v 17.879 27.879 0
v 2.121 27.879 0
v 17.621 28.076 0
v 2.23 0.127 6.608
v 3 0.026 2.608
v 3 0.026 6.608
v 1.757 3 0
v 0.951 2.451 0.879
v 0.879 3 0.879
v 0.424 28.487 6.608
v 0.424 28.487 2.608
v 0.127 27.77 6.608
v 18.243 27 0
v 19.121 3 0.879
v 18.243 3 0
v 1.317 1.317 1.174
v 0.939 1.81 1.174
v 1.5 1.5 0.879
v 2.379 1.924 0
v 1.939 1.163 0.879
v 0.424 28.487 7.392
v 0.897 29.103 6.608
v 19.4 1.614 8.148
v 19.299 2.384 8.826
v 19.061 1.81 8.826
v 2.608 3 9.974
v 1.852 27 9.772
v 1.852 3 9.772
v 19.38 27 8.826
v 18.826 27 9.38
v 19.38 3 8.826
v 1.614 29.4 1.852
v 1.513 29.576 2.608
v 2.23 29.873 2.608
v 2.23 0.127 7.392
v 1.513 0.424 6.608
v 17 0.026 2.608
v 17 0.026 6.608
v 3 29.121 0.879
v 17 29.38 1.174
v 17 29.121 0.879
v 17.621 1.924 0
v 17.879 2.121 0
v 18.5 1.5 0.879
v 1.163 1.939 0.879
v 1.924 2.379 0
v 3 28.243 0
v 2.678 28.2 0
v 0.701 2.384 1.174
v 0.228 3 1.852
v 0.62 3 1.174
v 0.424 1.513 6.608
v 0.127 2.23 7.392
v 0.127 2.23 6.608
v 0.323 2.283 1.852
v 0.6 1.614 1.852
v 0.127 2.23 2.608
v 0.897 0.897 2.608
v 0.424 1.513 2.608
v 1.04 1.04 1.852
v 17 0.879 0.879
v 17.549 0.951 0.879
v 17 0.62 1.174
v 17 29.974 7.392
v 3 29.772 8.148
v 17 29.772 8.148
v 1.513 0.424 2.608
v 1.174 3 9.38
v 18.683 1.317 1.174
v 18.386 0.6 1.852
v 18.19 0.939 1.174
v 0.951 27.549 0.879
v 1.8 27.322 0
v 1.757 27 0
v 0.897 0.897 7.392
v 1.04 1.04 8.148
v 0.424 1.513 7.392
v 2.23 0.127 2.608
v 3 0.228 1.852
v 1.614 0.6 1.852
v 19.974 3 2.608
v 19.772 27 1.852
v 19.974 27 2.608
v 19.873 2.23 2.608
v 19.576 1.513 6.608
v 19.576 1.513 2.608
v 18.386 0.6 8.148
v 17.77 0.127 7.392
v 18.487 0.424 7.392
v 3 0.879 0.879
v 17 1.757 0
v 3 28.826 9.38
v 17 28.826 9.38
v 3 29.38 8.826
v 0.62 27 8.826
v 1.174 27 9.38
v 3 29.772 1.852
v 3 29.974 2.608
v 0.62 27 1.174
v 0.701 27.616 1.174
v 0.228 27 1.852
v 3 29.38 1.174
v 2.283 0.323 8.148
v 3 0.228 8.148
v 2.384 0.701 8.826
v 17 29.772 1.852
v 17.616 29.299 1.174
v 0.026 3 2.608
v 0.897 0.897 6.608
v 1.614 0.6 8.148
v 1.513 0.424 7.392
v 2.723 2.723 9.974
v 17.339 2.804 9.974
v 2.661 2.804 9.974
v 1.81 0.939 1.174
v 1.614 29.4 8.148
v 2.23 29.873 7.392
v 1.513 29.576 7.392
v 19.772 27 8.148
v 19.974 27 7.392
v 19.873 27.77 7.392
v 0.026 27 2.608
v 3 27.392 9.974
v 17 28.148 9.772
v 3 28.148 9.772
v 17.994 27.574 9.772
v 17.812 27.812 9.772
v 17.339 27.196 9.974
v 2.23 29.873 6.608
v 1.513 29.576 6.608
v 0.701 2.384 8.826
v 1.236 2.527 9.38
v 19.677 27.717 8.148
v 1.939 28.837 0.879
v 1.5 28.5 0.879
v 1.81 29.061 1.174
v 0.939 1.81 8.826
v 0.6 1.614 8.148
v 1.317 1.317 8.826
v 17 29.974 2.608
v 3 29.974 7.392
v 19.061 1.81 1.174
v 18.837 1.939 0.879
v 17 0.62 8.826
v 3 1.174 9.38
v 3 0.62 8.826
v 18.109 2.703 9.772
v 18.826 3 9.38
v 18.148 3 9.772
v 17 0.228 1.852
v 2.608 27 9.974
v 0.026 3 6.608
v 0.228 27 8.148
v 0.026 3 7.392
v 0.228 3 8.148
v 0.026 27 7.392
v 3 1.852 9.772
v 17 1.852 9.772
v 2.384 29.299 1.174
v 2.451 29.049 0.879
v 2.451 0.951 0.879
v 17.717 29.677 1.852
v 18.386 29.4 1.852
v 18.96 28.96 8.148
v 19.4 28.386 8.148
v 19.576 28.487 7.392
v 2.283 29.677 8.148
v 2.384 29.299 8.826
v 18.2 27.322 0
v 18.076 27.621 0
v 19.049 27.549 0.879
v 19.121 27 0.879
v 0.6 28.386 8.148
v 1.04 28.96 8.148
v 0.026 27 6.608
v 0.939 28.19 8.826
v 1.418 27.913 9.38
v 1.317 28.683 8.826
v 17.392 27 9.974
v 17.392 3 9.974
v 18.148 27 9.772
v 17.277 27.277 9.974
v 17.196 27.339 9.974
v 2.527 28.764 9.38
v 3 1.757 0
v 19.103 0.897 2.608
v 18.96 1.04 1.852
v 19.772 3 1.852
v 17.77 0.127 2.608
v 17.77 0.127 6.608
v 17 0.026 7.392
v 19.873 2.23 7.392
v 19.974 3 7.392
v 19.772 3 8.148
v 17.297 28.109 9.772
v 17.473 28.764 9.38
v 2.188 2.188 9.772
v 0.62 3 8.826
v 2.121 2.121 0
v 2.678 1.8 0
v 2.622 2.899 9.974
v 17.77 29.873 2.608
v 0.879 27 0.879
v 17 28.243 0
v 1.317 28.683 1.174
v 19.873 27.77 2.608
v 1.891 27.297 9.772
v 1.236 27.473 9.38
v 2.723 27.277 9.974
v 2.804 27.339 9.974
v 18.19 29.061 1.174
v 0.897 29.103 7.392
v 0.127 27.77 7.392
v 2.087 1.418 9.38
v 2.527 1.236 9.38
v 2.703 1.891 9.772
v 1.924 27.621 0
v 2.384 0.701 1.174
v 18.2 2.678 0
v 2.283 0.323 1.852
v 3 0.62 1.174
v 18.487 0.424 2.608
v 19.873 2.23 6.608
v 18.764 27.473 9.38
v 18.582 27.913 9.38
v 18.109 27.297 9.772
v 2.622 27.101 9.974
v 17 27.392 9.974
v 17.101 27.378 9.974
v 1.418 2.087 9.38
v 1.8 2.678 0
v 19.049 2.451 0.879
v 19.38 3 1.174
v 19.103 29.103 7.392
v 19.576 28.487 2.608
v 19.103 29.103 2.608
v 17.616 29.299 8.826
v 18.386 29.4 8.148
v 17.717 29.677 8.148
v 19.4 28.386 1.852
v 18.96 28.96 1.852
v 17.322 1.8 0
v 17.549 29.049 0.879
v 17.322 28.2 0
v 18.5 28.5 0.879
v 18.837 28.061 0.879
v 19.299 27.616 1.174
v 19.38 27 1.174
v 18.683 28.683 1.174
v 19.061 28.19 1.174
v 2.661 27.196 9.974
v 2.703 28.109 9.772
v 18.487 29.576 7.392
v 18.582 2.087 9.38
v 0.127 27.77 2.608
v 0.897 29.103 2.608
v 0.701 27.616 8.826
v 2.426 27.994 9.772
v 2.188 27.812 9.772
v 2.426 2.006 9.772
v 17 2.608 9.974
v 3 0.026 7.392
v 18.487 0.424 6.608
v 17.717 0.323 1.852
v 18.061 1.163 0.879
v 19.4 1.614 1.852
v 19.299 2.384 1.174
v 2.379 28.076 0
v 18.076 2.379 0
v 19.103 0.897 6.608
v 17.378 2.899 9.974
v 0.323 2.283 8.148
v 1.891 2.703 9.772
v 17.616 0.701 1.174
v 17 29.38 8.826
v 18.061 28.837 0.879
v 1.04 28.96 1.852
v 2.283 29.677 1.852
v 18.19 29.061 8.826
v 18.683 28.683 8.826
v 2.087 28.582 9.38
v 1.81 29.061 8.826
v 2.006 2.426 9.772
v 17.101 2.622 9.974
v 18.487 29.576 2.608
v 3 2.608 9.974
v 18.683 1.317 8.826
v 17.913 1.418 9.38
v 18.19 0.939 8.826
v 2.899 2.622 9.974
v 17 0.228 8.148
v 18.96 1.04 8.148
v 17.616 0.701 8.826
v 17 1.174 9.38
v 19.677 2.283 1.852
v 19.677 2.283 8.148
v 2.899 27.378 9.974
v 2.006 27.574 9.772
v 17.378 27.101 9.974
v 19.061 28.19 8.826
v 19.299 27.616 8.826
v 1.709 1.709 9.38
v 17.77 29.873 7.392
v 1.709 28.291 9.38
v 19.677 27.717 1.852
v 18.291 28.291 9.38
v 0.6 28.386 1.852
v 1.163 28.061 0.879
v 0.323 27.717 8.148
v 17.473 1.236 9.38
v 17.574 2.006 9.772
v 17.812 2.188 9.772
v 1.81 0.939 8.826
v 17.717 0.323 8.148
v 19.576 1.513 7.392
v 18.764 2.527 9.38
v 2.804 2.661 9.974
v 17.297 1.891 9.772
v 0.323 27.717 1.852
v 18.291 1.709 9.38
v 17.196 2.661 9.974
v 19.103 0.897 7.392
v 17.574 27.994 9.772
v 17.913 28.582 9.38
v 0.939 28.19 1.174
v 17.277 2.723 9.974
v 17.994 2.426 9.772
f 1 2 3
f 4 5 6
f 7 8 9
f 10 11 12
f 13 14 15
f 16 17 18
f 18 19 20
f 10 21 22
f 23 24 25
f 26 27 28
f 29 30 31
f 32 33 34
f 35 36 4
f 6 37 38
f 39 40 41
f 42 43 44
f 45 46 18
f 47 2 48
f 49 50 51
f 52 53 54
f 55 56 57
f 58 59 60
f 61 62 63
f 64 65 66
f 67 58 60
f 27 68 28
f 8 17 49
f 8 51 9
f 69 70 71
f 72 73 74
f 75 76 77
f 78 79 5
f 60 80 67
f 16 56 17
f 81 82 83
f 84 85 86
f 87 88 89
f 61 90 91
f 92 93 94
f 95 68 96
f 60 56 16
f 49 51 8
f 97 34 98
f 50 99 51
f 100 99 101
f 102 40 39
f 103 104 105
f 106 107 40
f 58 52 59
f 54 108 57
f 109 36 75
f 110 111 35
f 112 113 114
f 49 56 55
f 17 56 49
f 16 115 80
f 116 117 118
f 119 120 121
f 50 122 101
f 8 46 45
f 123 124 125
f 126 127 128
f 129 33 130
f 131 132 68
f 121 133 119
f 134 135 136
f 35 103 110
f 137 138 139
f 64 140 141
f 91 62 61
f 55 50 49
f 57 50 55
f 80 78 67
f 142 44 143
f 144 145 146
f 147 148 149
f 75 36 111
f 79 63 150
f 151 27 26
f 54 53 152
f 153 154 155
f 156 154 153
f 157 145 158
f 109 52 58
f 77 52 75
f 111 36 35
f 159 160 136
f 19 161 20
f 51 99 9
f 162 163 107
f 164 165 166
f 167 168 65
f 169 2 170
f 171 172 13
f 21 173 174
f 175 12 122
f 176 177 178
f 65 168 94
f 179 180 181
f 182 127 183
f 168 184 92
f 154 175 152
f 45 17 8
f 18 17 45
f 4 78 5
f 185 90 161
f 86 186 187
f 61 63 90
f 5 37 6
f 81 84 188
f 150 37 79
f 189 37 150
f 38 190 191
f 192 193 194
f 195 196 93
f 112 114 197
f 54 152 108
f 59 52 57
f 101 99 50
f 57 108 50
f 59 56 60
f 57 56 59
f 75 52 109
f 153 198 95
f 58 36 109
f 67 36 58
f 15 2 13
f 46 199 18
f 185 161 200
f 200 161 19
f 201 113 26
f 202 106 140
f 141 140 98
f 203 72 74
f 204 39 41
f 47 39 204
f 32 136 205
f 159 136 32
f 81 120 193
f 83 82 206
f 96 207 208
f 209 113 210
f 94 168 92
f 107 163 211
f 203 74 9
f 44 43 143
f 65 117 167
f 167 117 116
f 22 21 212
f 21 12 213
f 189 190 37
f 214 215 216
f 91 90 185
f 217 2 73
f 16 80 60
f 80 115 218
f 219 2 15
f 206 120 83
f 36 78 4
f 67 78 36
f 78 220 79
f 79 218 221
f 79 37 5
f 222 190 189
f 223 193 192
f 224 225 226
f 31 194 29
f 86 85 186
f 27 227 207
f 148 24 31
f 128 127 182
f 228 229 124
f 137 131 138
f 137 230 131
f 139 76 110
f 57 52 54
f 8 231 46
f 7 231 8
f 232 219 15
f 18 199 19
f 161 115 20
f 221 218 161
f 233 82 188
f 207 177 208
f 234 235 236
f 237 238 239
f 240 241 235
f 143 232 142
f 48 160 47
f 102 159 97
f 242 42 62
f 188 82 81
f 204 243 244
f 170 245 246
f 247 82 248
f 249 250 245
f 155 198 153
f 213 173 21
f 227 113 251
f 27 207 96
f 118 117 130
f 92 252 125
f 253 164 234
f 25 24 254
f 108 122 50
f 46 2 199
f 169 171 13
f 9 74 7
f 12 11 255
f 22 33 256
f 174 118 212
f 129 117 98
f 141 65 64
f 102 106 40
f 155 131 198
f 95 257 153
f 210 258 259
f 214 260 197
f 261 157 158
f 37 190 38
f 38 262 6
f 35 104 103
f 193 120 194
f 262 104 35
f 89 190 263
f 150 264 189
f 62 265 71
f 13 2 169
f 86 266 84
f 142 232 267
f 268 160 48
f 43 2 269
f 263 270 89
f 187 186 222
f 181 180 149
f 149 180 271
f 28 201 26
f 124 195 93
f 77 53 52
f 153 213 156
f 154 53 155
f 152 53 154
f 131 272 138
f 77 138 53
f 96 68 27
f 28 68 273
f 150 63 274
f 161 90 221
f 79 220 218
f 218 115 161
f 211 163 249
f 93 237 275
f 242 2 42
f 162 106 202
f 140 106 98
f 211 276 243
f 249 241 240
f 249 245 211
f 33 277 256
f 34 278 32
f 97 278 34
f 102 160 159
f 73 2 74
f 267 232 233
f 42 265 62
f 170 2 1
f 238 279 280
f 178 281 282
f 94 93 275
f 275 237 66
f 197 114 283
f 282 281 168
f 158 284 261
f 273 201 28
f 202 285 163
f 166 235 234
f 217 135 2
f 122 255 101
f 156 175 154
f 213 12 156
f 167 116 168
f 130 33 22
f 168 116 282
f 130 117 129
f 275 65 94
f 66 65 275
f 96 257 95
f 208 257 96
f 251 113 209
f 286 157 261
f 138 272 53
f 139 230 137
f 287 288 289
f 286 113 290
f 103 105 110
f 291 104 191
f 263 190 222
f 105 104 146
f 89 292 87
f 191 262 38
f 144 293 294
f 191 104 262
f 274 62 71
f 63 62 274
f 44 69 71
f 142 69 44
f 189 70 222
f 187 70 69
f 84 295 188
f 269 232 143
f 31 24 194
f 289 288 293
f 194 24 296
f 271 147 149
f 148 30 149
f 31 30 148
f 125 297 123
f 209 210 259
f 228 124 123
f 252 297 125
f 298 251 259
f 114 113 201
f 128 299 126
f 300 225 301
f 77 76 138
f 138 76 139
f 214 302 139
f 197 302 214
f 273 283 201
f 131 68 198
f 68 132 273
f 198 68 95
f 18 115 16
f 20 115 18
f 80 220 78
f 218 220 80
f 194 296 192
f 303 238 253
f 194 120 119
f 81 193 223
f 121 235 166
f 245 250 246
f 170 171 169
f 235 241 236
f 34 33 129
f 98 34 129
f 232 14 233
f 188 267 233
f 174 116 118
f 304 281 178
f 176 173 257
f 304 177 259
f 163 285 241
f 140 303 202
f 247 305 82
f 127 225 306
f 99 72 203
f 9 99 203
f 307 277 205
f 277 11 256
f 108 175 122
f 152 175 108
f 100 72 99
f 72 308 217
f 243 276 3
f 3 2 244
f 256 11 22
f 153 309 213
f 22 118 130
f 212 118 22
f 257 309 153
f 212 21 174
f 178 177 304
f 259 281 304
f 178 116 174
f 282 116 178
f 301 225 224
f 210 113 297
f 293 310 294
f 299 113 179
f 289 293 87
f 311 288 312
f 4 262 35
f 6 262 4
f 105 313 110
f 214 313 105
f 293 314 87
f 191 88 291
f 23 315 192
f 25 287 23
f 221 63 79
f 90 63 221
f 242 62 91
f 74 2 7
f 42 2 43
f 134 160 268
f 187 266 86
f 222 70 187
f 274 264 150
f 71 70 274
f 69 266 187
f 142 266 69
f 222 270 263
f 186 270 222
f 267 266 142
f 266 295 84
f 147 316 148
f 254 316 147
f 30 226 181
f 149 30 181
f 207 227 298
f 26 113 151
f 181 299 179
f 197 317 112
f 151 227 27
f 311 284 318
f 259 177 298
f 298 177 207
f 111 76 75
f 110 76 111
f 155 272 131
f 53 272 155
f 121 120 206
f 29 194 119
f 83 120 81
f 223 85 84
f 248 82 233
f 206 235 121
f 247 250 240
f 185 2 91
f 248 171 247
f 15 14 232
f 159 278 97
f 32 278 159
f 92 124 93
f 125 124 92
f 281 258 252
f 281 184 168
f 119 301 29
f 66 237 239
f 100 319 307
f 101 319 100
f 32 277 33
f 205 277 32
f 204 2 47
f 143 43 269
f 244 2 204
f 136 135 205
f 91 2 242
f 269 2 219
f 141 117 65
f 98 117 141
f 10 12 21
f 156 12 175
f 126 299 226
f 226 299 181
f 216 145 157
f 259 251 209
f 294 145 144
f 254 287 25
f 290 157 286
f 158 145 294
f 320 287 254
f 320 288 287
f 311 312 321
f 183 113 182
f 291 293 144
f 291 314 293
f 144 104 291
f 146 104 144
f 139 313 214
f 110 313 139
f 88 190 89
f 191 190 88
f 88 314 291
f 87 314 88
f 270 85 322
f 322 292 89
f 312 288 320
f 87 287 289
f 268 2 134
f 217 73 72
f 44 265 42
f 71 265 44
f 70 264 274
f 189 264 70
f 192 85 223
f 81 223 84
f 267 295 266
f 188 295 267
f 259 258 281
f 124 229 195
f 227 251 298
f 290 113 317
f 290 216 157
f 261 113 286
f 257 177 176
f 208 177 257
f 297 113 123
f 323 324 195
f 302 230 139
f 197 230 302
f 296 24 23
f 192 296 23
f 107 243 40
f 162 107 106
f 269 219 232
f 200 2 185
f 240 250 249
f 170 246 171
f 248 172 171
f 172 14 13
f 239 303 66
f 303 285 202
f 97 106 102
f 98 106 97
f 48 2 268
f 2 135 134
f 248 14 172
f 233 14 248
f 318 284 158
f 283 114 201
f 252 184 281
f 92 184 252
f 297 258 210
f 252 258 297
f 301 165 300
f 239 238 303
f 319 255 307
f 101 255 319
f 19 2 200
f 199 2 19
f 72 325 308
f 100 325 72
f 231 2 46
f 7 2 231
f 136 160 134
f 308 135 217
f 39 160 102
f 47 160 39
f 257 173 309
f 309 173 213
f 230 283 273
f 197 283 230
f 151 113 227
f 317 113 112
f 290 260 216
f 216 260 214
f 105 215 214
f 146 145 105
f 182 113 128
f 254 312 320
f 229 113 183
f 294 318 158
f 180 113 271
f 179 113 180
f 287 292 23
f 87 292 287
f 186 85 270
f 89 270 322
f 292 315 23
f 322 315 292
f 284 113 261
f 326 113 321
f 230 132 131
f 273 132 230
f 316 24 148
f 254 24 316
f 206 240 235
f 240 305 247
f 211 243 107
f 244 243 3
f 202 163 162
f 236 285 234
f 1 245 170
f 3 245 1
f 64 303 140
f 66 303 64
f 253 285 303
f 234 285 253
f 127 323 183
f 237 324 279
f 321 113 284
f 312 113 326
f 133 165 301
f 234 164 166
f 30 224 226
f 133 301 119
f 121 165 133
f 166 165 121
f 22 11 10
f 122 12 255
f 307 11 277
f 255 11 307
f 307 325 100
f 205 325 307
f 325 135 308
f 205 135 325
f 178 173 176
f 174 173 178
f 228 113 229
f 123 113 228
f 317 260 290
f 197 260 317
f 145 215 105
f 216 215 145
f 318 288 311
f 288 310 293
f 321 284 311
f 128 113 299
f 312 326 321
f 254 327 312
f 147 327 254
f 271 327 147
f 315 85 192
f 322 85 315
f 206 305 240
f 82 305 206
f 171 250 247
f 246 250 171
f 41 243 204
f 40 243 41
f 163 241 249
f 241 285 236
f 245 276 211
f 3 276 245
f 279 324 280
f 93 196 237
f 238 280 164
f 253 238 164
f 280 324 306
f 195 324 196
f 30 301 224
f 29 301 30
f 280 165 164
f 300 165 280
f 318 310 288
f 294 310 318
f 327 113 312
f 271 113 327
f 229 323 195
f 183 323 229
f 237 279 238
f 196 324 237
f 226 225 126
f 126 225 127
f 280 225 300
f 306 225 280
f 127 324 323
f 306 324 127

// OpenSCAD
// file: Mendel90.scad
//
// QP_OpenSCAD_lib
//
// GNU GPL v3
// quackingplums@gmail.com
//
// Mendel90 dimensions, etc
//

IKEA_SORLI = ["IKEA SÖRLI", 196, 196, 18];

function build_plate_name(build_plate) = build_plate[0];
function build_plate_x(build_plate) = build_plate[1];		// width
function build_plate_y(build_plate) = build_plate[2];		// depth
function build_plate_cr(build_plate) = build_plate[3];		// corner radius

default_build_plate = IKEA_SORLI;

function max_width(build_plate = default_build_plate) = 
	build_plate_x(build_plate);

function max_depth(build_plate = default_build_plate) = 
	build_plate_y(build_plate);

function max_diagonal(build_plate = default_build_plate) = 
	sqrt(
		pow(build_plate_x(build_plate) - 2*build_plate_cr(build_plate), 2) +
		pow(build_plate_y(build_plate) - 2*build_plate_cr(build_plate), 2)
	) + 2*build_plate_cr(build_plate);

module show_build_area(build_plate = default_build_plate)
{
	%	// transparency modifier - doesn't print
	hull()
	{
		translate([build_plate_x(build_plate)/2 - build_plate_cr(build_plate), build_plate_y(build_plate)/2 - build_plate_cr(build_plate), -1])
			cylinder(h = 1, r = build_plate_cr(build_plate));
		translate([-build_plate_x(build_plate)/2 + build_plate_cr(build_plate), build_plate_y(build_plate)/2 - build_plate_cr(build_plate), -1])
			cylinder(h = 1, r = build_plate_cr(build_plate));
		translate([-build_plate_x(build_plate)/2 + build_plate_cr(build_plate), -build_plate_y(build_plate)/2 + build_plate_cr(build_plate), -1])
			cylinder(h = 1, r = build_plate_cr(build_plate));
		translate([build_plate_x(build_plate)/2 - build_plate_cr(build_plate), -build_plate_y(build_plate)/2 + build_plate_cr(build_plate), -1])
			cylinder(h = 1, r = build_plate_cr(build_plate));
	}
}

module show_M90_build_area()
{
	show_build_area(build_area = IKEA_SORLI);
}

//echo(max_diagonal());
// file: common.scad
//
// QP_OpenSCAD_lib
//
// GNU GPL v3
// quackingplums@gmail.com
//
// Useful tools and utilities
//
use <Mendel90.scad>;

/*
module position(translate = [], rotate = [], colour = -1)
Rotate, translate and colour an arbitrary list of objects. In that order
translate		coordinate vector
rotate    		axis angles
colour   		any valid w3/css3 colour name

module show_build_area(x = 196, y = 196, corner_radius = 18)
Draw (non-printing) build platform template
Useful for plating up objects.
Default to Mendel90 with IKEA SÖRLI mirror tile.
x				x dimension
y				y dimension
corner_radius	20mm for SÖRLI

module slot(length, width, depth)
Subtractive rounded-end slot shape to fit within given dimensions
length			length of slot including radii
width			width of slot
depth			depth of slot
*/


module position(translate = [], rotate = [], mirror = [0, 0, 0], colour = -1)
{
	for (i = [0 : $children-1])
		translate(translate)
			rotate(rotate)
				mirror(mirror)
					if (colour == -1)
						children(i);
					else
						color(colour)
							children(i);
}

module show_build_area(x = 196, y = 196, corner_radius = 18)
{
	echo("DEPRECATED: show_build_area() is now in Mendel90.scad and will be removed from common.scad in a future version.");
	show_M90_build_area();
}

module slot(length, width, depth)
{
	hull()
	{
		cylinder(h = depth, r = width/2);
		translate([length - width, 0, 0])
			cylinder(h = depth, r = width/2);
	}
}

function rms(a, b) = 
	sqrt(pow(a, 2) + pow(b, 2));
// main file
/**************************************************
| Rounded corners are less prone to lifting than
| sharp corners. They also look nicer.
**************************************************/
use <common.scad>;

$fn = 24;
ff = 0.05;

// ***** examples *****
//rounded_rect(length = 30, width = 20, corner_radius = 5);
//rounded_rect(length = 30, width = 20, corner_radius = 5, height = 5);
//rounded_cube([20, 30, 10], corner_radius = 3);
rounded_cube([20, 30, 10], corner_radius = 3, teardrop = true);


function corner_centres(length, width, radius) =
	[[radius, radius], [radius, width-radius], [length-radius, width-radius], [length-radius, radius]];

function minimum_corner_radius(edge_clearance) =			// square peg/round hole problem
	edge_clearance / (sqrt(2)-1) + edge_clearance;

module rounded_rect(length, width, corner_radius, height = ff)
{
	cuboid = [length, width, height];
	rounded_cube2(cuboid, corner_radius);
}

module rounded_cube2(cuboid, corner_radius)
{
	l = cuboid[0];
	w = cuboid[1];
	h = cuboid[2];
	r = corner_radius;

	corner_centres = corner_centres(l, w, r);

	hull()
		for (i = [0 : len(corner_centres)-1])
			translate(corner_centres[i])
				cylinder(h = h, r = r);
}

module rounded_cube(cuboid, corner_radius, teardrop = false)
// always draws a cube with minimum height = 2*corner_radius
{
	l = cuboid[0];
	w = cuboid[1];
	h = cuboid[2];
	r = corner_radius;

	corner_centres = corner_centres(l, w, r);

	hull()
	{
		// bottom
		translate([0, 0, r])	// offset for bottom corners
			for (i = [0 : len(corner_centres)-1])
				translate(corner_centres[i])
					if (teardrop)
						teardrop(r = r, truncate = true, invert = true);
					else
						sphere(r = r);

		// top
		if (h > 2*r)
			translate([0, 0, h-r])	// offset for top corners
				for (i = [0 : len(corner_centres)-1])
					translate(corner_centres[i])
							sphere(r = r);
	}

}

//teardrop(30, true, true);
module teardrop(r, truncate = false, invert = false)
{
	mirror([0, 0, invert ? 1 : 0])
		difference()
		{
			union()
			{
				sphere(r = r);
				translate([0, 0, r / sqrt(2)])
					cylinder(h = r/sqrt(2), r1 = r/sqrt(2), r2 = 0);
			}
			if (truncate)
				translate([0, 0, 2*r])
					cube(2*r, center = true);
		} 
}
